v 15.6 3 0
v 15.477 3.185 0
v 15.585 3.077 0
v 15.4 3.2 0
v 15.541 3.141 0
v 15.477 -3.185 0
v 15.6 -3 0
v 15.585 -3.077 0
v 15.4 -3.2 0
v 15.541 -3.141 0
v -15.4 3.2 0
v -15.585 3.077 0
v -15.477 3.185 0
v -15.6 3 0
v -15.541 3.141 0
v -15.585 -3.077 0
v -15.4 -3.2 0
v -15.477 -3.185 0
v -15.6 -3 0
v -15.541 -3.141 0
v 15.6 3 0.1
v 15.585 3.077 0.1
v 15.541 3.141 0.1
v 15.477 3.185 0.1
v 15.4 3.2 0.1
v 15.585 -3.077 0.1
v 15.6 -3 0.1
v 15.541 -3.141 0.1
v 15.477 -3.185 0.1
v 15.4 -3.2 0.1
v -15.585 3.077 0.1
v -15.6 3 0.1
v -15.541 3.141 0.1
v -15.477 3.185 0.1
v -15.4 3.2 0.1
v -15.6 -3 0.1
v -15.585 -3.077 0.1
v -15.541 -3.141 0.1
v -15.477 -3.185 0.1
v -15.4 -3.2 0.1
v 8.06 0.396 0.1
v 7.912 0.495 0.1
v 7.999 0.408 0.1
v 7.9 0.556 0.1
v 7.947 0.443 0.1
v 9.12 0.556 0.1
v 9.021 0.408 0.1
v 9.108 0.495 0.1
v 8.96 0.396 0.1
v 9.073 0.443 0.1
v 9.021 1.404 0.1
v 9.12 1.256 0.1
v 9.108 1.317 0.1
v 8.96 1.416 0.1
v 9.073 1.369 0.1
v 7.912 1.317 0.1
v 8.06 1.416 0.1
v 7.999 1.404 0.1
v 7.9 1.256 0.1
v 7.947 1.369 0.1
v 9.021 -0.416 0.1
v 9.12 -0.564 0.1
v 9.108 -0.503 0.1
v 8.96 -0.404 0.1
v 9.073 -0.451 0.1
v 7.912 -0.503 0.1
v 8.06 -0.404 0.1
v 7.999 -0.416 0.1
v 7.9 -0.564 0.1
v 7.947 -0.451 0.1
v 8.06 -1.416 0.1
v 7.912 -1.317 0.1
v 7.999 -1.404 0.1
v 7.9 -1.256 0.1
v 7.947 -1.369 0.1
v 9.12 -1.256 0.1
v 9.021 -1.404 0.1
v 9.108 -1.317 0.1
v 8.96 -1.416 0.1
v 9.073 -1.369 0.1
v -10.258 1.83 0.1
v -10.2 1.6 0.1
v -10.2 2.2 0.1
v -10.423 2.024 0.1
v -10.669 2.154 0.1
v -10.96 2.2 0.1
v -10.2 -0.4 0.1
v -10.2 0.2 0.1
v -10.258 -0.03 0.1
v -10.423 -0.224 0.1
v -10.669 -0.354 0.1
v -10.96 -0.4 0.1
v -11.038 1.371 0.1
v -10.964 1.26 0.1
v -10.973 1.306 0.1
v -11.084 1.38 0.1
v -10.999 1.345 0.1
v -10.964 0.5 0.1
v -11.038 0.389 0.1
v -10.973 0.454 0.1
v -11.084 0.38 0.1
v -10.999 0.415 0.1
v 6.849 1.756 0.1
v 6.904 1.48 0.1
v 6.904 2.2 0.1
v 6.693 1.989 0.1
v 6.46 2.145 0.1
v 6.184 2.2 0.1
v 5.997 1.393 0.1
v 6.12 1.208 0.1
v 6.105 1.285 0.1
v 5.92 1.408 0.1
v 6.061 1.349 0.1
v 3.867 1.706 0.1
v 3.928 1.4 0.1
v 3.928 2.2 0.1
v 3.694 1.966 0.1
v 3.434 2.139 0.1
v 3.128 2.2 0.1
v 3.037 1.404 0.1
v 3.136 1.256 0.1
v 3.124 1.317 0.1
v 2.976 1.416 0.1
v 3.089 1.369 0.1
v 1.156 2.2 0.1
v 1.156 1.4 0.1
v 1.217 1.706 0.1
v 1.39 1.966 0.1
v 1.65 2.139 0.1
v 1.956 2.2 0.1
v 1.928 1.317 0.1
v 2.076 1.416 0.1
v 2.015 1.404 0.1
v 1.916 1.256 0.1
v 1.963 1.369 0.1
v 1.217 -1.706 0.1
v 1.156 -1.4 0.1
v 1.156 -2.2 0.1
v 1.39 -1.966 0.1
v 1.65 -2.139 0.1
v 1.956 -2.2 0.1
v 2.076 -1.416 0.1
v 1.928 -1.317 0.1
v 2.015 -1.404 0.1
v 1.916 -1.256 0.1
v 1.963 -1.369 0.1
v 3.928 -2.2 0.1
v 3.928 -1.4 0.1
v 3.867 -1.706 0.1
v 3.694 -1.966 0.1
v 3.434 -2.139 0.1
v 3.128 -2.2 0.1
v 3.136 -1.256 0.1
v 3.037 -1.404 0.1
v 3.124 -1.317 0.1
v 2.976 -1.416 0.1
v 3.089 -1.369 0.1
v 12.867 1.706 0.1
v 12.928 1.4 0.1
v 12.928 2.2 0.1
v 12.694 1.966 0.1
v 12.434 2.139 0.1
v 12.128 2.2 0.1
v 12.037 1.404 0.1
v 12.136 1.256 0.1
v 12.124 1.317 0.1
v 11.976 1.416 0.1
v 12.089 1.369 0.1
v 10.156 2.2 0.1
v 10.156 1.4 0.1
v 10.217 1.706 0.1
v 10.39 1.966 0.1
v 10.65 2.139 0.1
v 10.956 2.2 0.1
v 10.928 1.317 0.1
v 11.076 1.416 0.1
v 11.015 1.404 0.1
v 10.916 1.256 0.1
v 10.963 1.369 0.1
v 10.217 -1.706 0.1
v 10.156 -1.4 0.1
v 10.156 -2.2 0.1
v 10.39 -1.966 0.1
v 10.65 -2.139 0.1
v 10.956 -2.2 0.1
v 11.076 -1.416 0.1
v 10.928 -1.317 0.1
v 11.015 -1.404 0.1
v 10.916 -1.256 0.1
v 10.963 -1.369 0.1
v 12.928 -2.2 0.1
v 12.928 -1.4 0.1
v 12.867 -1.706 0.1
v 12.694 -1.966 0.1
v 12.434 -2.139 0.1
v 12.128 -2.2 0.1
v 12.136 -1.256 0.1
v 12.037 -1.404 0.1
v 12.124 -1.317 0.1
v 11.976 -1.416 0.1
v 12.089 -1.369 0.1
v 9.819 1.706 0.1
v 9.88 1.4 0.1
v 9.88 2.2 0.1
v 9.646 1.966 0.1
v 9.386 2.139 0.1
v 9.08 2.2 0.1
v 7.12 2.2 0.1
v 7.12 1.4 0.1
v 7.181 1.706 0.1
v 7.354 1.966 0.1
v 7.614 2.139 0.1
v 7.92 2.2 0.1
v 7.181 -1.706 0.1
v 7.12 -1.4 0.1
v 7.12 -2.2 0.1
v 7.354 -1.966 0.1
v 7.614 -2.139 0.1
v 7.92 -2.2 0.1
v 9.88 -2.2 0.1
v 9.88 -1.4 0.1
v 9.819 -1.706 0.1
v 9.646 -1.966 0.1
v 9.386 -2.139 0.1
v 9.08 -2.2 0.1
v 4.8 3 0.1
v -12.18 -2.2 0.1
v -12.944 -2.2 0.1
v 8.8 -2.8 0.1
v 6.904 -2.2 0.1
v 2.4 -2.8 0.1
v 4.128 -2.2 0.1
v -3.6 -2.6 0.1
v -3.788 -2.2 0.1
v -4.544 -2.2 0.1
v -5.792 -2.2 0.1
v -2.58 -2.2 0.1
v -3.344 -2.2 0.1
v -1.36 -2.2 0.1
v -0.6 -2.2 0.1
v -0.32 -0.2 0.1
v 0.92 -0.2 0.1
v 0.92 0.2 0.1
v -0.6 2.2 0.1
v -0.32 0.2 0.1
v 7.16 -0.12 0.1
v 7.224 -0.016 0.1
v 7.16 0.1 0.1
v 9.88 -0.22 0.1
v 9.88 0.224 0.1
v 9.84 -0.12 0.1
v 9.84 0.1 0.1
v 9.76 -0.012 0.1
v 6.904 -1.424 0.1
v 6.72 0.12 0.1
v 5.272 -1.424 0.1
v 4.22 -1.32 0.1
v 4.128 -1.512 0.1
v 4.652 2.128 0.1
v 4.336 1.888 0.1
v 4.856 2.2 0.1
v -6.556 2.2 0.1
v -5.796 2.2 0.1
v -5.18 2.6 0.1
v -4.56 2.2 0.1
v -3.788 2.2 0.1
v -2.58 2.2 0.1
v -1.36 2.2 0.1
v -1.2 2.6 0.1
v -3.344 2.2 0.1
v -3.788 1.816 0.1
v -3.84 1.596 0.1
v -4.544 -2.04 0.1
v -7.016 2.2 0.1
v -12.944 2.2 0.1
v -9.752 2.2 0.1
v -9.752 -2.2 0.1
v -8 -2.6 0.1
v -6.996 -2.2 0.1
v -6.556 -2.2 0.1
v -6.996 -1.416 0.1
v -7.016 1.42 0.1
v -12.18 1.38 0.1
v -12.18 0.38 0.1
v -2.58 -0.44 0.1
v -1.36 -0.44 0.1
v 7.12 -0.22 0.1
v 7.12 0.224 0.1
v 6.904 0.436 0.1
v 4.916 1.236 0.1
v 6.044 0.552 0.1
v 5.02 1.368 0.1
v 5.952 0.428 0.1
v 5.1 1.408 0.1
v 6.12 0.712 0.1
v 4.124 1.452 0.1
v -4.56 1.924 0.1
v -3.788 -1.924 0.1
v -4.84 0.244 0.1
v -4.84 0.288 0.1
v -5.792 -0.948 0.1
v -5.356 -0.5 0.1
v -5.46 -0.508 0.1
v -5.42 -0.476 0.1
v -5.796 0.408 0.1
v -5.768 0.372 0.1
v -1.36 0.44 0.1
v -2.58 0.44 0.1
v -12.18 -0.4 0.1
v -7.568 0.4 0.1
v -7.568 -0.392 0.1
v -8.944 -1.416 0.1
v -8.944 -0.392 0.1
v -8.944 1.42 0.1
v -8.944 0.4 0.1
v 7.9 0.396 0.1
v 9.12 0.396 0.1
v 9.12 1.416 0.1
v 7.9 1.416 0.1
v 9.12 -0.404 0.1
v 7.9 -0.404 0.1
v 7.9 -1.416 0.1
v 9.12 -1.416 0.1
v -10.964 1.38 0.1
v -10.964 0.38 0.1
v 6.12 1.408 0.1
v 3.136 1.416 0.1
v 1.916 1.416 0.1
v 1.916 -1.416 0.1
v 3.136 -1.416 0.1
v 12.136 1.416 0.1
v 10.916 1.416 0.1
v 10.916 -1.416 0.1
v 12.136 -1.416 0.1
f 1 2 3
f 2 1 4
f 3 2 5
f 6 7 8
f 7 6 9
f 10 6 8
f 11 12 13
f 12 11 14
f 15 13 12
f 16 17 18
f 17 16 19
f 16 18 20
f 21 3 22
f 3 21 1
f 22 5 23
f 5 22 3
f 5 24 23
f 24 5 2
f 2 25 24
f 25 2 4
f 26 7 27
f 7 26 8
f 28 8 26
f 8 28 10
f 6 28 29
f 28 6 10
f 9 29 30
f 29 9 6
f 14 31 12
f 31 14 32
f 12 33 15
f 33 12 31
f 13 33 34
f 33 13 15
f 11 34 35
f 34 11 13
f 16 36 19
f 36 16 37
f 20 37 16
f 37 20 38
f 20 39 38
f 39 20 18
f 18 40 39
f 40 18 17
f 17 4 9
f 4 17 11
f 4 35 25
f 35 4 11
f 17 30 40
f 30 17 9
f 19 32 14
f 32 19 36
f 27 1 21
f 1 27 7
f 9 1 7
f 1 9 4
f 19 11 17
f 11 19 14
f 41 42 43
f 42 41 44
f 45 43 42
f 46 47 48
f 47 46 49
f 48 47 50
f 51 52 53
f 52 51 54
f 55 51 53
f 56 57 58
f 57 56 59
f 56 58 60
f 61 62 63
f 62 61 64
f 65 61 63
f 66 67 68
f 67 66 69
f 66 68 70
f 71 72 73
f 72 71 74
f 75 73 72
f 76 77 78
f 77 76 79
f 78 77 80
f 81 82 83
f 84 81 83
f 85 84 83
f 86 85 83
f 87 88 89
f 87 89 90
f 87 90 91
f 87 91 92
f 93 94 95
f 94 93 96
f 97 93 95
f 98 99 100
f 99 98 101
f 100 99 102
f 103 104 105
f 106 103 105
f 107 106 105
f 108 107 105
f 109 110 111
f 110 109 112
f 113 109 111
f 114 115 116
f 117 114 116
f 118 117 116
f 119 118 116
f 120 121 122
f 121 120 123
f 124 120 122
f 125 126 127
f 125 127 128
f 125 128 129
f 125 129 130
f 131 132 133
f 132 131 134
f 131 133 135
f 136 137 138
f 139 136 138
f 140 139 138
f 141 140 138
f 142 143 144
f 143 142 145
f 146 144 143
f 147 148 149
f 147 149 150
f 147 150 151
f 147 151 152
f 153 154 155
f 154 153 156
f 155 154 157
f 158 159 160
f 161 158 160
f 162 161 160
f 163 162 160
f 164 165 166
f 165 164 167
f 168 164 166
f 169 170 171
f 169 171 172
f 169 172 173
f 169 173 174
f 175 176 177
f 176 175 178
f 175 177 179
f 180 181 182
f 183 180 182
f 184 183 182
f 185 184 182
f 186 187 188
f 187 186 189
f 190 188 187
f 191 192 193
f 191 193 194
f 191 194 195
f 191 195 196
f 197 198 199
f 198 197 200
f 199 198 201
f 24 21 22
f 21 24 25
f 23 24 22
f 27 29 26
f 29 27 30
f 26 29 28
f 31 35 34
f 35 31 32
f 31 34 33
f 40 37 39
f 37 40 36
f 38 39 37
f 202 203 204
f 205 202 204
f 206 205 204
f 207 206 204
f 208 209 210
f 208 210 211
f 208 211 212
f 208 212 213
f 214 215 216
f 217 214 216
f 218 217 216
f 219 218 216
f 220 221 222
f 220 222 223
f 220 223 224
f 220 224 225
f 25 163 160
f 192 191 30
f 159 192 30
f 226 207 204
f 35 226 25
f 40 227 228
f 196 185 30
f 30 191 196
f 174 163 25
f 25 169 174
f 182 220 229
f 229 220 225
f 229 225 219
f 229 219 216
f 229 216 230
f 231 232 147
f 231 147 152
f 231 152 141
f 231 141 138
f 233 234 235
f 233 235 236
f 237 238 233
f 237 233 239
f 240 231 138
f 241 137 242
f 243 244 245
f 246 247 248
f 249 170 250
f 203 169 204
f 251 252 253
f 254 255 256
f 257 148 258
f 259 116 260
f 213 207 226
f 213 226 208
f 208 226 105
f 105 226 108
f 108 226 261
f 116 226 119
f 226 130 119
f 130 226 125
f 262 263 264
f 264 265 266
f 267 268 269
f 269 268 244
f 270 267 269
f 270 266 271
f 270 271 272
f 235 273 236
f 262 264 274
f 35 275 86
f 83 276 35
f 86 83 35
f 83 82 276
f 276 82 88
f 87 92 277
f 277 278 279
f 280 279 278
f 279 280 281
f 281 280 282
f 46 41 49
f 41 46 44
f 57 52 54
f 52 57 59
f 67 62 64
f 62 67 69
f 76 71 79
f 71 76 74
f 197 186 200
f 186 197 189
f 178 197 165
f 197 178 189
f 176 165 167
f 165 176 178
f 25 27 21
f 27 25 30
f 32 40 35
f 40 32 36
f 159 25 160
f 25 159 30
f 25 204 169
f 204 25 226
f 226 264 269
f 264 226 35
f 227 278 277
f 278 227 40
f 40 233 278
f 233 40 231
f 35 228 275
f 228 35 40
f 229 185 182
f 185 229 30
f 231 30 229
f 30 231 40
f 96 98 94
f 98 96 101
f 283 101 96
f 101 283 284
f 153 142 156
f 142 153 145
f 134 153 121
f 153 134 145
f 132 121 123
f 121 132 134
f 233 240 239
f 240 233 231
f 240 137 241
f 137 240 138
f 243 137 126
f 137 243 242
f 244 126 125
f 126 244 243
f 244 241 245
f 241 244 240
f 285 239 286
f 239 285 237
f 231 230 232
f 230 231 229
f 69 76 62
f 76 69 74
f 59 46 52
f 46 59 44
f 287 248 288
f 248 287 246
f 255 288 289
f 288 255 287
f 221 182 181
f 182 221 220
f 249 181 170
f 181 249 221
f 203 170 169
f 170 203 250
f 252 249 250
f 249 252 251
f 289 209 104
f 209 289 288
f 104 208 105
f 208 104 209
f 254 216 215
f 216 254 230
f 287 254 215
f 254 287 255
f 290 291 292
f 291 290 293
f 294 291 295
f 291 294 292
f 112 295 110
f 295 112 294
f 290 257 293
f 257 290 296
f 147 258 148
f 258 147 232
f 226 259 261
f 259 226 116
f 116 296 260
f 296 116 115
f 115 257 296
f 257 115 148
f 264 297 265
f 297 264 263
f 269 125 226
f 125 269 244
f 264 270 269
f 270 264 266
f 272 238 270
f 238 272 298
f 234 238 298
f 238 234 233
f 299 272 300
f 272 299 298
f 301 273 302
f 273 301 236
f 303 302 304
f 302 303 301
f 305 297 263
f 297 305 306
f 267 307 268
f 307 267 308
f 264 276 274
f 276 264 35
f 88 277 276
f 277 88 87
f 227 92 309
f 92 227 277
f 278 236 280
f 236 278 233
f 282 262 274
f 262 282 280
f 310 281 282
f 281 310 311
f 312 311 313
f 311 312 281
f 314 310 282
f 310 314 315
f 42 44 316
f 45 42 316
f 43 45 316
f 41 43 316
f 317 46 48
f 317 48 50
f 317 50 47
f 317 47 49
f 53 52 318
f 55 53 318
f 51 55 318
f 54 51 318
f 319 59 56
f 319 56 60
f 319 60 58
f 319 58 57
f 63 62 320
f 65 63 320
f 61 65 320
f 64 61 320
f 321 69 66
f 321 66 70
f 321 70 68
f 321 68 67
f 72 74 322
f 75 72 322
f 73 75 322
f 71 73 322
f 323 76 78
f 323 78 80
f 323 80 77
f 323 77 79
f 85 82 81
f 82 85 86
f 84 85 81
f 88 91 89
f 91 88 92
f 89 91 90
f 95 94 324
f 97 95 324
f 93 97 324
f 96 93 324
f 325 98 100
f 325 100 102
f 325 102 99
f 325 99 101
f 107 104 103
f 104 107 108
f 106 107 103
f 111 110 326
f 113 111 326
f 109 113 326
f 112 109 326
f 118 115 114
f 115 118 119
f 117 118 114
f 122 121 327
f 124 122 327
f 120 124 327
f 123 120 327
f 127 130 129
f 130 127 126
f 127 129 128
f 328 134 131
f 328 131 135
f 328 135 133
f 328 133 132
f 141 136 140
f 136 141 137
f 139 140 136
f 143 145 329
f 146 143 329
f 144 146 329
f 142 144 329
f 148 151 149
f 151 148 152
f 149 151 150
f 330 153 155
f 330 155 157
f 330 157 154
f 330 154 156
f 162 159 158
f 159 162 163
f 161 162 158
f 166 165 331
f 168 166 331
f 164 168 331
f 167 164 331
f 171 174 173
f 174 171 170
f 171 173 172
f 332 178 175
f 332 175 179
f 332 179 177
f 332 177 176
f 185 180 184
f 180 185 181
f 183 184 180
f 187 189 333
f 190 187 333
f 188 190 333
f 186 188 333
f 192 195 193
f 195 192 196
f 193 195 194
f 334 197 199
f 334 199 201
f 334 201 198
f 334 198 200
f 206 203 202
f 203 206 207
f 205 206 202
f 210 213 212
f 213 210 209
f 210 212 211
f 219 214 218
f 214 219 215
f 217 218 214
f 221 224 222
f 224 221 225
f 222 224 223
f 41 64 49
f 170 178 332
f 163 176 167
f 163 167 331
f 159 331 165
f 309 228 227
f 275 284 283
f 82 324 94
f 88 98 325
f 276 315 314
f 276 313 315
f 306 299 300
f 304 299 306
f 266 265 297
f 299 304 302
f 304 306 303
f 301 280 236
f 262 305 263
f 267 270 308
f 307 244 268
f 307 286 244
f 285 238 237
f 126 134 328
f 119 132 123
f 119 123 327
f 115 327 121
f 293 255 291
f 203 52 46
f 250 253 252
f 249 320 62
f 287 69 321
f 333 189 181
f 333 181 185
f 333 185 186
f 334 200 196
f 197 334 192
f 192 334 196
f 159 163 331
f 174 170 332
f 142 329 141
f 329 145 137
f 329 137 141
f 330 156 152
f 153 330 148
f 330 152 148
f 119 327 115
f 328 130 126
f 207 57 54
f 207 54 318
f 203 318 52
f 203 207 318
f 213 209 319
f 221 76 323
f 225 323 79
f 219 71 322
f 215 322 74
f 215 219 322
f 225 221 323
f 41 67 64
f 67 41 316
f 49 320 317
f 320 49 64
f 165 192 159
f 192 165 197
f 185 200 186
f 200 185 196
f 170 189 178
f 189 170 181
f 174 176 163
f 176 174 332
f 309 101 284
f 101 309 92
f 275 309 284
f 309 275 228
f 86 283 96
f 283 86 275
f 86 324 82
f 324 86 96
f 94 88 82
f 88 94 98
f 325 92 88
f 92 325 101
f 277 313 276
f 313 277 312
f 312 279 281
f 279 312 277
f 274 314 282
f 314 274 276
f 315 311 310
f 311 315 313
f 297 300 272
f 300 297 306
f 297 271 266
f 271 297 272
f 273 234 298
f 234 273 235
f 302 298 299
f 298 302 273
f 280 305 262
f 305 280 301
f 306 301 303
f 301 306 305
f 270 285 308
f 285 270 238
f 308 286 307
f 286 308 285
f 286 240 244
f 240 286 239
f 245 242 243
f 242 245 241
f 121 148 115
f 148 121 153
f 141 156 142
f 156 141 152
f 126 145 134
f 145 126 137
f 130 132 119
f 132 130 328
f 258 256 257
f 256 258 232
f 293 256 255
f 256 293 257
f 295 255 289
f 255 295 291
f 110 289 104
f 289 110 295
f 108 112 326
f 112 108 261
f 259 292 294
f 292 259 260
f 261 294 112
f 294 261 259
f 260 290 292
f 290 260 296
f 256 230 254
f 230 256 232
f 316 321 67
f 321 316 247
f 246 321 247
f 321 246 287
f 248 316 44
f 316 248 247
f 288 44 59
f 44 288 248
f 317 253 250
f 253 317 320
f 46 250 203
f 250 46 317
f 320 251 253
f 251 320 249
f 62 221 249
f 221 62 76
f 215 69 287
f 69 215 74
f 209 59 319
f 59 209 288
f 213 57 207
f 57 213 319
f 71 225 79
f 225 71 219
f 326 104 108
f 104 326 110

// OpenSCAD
// file: ../p/1-4ndis.scad
use <../lib.scad>
function ldraw_lib__1_4ndis() = [
// 0 Disc Negative 0.25
// 0 Name: 1-4ndis.dat
// 0 Author: James Jessiman
// 0 !LDRAW_ORG Primitive UPDATE 2012-01
// 0 !LICENSE Licensed under CC BY 2.0 and CC BY 4.0 : see CAreadme.txt
// 
// 0 BFC CERTIFY CCW
  [0,"BFC","CERTIFY"],
  [0,"BFC","CCW"],
// 
// 0 !HISTORY 2002-03-23 [sbliss] Added BFC Statement
// 0 !HISTORY 2002-04-25 [PTadmin] Official Update 2002-02
// 0 !HISTORY 2007-06-22 [PTadmin] Header formatted for Contributor Agreement
// 0 !HISTORY 2008-07-01 [PTadmin] Official Update 2008-01
// 0 !HISTORY 2012-02-16 [Philo] Changed to CCW
// 0 !HISTORY 2012-03-30 [PTadmin] Official Update 2012-01
// 
// 
// 3 16 0.9239 0 0.3827 1 0 0 1 0 1
  [3,16,0.9239,0,0.3827,1,0,0,1,0,1],
// 3 16 0.7071 0 0.7071 0.9239 0 0.3827 1 0 1
  [3,16,0.7071,0,0.7071,0.9239,0,0.3827,1,0,1],
// 3 16 0.3827 0 0.9239 0.7071 0 0.7071 1 0 1
  [3,16,0.3827,0,0.9239,0.7071,0,0.7071,1,0,1],
// 3 16 0 0 1 0.3827 0 0.9239 1 0 1
  [3,16,0,0,1,0.3827,0,0.9239,1,0,1],
];
module ldraw_lib__1_4ndis(step=0, col=false, unit=2/5, alt=false, line=0.2, solid=!$preview)
    makepoly(ldraw_lib__1_4ndis(), step=step, col=col, unit=unit, alt=alt, line=line, solid=solid);
ldraw_lib__1_4ndis(line=0.2);
// file: ../p/box3u12.scad
use <../lib.scad>
function ldraw_lib__box3u12() = [
// 0 Box with 3 Parallel Faces without Any Edges
// 0 Name: box3u12.dat
// 0 Author: J.C. Tchang [tchang]
// 0 !LDRAW_ORG Primitive UPDATE 2014-02
// 0 !LICENSE Licensed under CC BY 2.0 and CC BY 4.0 : see CAreadme.txt
// 
// 0 BFC CERTIFY CCW
  [0,"BFC","CERTIFY"],
  [0,"BFC","CCW"],
// 
// 0 !HISTORY 2014-12-23 [PTadmin] Official Update 2014-02
// 
// 
// 4 16 -1 1 1 1 1 1 1 1 -1 -1 1 -1
  [4,16,-1,1,1,1,1,1,1,1,-1,-1,1,-1],
// 4 16 -1 1 1 -1 0 1 1 0 1 1 1 1
  [4,16,-1,1,1,-1,0,1,1,0,1,1,1,1],
// 4 16 1 1 -1 1 0 -1 -1 0 -1 -1 1 -1
  [4,16,1,1,-1,1,0,-1,-1,0,-1,-1,1,-1],
];
module ldraw_lib__box3u12(step=0, col=false, unit=2/5, alt=false, line=0.2, solid=!$preview)
    makepoly(ldraw_lib__box3u12(), step=step, col=col, unit=unit, alt=alt, line=line, solid=solid);
ldraw_lib__box3u12(line=0.2);
// file: ../p/1-4cyli.scad
use <../lib.scad>
function ldraw_lib__1_4cyli() = [
// 0 Cylinder 0.25
// 0 Name: 1-4cyli.dat
// 0 Author: James Jessiman
// 0 !LDRAW_ORG Primitive UPDATE 2012-01
// 0 !LICENSE Licensed under CC BY 2.0 and CC BY 4.0 : see CAreadme.txt
// 
// 0 BFC CERTIFY CCW
  [0,"BFC","CERTIFY"],
  [0,"BFC","CCW"],
// 
// 0 !HISTORY 2002-03-23 [sbliss] Added BFC statement.
// 0 !HISTORY 2002-04-25 [PTadmin] Official Update 2002-02
// 0 !HISTORY 2007-06-22 [PTadmin] Header formatted for Contributor Agreement
// 0 !HISTORY 2008-07-01 [PTadmin] Official Update 2008-01
// 0 !HISTORY 2012-02-16 [Philo] Changed to CCW
// 0 !HISTORY 2012-03-30 [PTadmin] Official Update 2012-01
// 
// 
// 4 16 1 1 0 0.9239 1 0.3827 0.9239 0 0.3827 1 0 0
  [4,16,1,1,0,0.9239,1,0.3827,0.9239,0,0.3827,1,0,0],
// 5 24 1 0 0 1 1 0 0.9239 0 0.3827 1 0 -1
  [5,24,1,0,0,1,1,0,0.9239,0,0.3827,1,0,-1],
// 4 16 0.9239 1 0.3827 0.7071 1 0.7071 0.7071 0 0.7071 0.9239 0 0.3827
  [4,16,0.9239,1,0.3827,0.7071,1,0.7071,0.7071,0,0.7071,0.9239,0,0.3827],
// 5 24 0.9239 0 0.3827 0.9239 1 0.3827 0.7071 0 0.7071 1 0 0
  [5,24,0.9239,0,0.3827,0.9239,1,0.3827,0.7071,0,0.7071,1,0,0],
// 4 16 0.7071 1 0.7071 0.3827 1 0.9239 0.3827 0 0.9239 0.7071 0 0.7071
  [4,16,0.7071,1,0.7071,0.3827,1,0.9239,0.3827,0,0.9239,0.7071,0,0.7071],
// 5 24 0.7071 0 0.7071 0.7071 1 0.7071 0.3827 0 0.9239 0.9239 0 0.3827
  [5,24,0.7071,0,0.7071,0.7071,1,0.7071,0.3827,0,0.9239,0.9239,0,0.3827],
// 4 16 0.3827 1 0.9239 0 1 1 0 0 1 0.3827 0 0.9239
  [4,16,0.3827,1,0.9239,0,1,1,0,0,1,0.3827,0,0.9239],
// 5 24 0.3827 0 0.9239 0.3827 1 0.9239 0 0 1 0.7071 0 0.7071
  [5,24,0.3827,0,0.9239,0.3827,1,0.9239,0,0,1,0.7071,0,0.7071],
// 5 24 0 0 1 0 1 1 0.3827 0 0.9239 -1 0 1
  [5,24,0,0,1,0,1,1,0.3827,0,0.9239,-1,0,1],
];
module ldraw_lib__1_4cyli(step=0, col=false, unit=2/5, alt=false, line=0.2, solid=!$preview)
    makepoly(ldraw_lib__1_4cyli(), step=step, col=col, unit=unit, alt=alt, line=line, solid=solid);
ldraw_lib__1_4cyli(line=0.2);
// file: ../p/1-4chrd.scad
use <../lib.scad>
function ldraw_lib__1_4chrd() = [
// 0 Chord 0.25
// 0 Name: 1-4chrd.dat
// 0 Author: Tony Hafner [hafhead]
// 0 !LDRAW_ORG Primitive UPDATE 2012-02
// 0 !LICENSE Licensed under CC BY 2.0 and CC BY 4.0 : see CAreadme.txt
// 
// 0 BFC CERTIFY CCW
  [0,"BFC","CERTIFY"],
  [0,"BFC","CCW"],
// 
// 0 !HISTORY 2004-04-22 [PTadmin] Official Update 2004-02
// 0 !HISTORY 2007-10-09 [PTadmin] Header formatted for Contributor Agreement
// 0 !HISTORY 2008-07-01 [PTadmin] Official Update 2008-01
// 0 !HISTORY 2012-08-02 [MMR1988] Re-creation with PrimGen2 and Rectifier
// 0 !HISTORY 2012-08-09 [PTadmin] Official Update 2012-02
// 
// 
// 4 16 0.9239 0 0.3827 0.3827 0 0.9239 0 0 1 1 0 0
  [4,16,0.9239,0,0.3827,0.3827,0,0.9239,0,0,1,1,0,0],
// 3 16 0.7071 0 0.7071 0.3827 0 0.9239 0.9239 0 0.3827
  [3,16,0.7071,0,0.7071,0.3827,0,0.9239,0.9239,0,0.3827],
];
module ldraw_lib__1_4chrd(step=0, col=false, unit=2/5, alt=false, line=0.2, solid=!$preview)
    makepoly(ldraw_lib__1_4chrd(), step=step, col=col, unit=unit, alt=alt, line=line, solid=solid);
ldraw_lib__1_4chrd(line=0.2);
// main file
use <../lib.scad>
use <../p/1-4chrd.scad>
use <../p/1-4cyli.scad>
use <../p/box3u12.scad>
use <s/6258203js01.scad>
function ldraw_lib__6258203k() = [
// 0 Sticker  0.8 x  3.9 with Yellow License Plate "PEKH-0280"
// 0 Name: 6258203k.dat
// 0 Author: Ulrich Röder [UR]
// 0 !LDRAW_ORG Part UPDATE 2019-01
// 0 !LICENSE Licensed under CC BY 2.0 and CC BY 4.0 : see CAreadme.txt
// 
// 0 BFC CERTIFY CCW
  [0,"BFC","CERTIFY"],
  [0,"BFC","CCW"],
// 
// 0 !KEYWORDS Ford, Mustang, Set 10265
// 
// 0 !HISTORY 2019-06-28 [PTadmin] Official Update 2019-01
// 
// 
// 0 // Font: Registration Plate UK
// 
// 0 // Main
// 0 // Box Rounded
// 
// 1 16 38.5 0 7.5 .5 0 0 0 -1 0 0 0 .5 1-4chrd.dat
  [1,16,38.5,0,7.5,.5,0,0,0,-1,0,0,0,.5, ldraw_lib__1_4chrd()],
// 1 16 38.5 0 -7.5 .5 0 0 0 -1 0 0 0 -.5 1-4chrd.dat
  [1,16,38.5,0,-7.5,.5,0,0,0,-1,0,0,0,-.5, ldraw_lib__1_4chrd()],
// 1 16 -38.5 0 7.5 -.5 0 0 0 -1 0 0 0 .5 1-4chrd.dat
  [1,16,-38.5,0,7.5,-.5,0,0,0,-1,0,0,0,.5, ldraw_lib__1_4chrd()],
// 1 16 -38.5 0 -7.5 -.5 0 0 0 -1 0 0 0 -.5 1-4chrd.dat
  [1,16,-38.5,0,-7.5,-.5,0,0,0,-1,0,0,0,-.5, ldraw_lib__1_4chrd()],
// 1 16 38.5 0 7.5 .5 0 0 0 -.25 0 0 0 .5 1-4cyli.dat
  [1,16,38.5,0,7.5,.5,0,0,0,-.25,0,0,0,.5, ldraw_lib__1_4cyli()],
// 1 16 38.5 0 -7.5 .5 0 0 0 -.25 0 0 0 -.5 1-4cyli.dat
  [1,16,38.5,0,-7.5,.5,0,0,0,-.25,0,0,0,-.5, ldraw_lib__1_4cyli()],
// 1 16 -38.5 0 7.5 -.5 0 0 0 -.25 0 0 0 .5 1-4cyli.dat
  [1,16,-38.5,0,7.5,-.5,0,0,0,-.25,0,0,0,.5, ldraw_lib__1_4cyli()],
// 1 16 -38.5 0 -7.5 -.5 0 0 0 -.25 0 0 0 -.5 1-4cyli.dat
  [1,16,-38.5,0,-7.5,-.5,0,0,0,-.25,0,0,0,-.5, ldraw_lib__1_4cyli()],
// 1 16 0 -.25 0 38.5 0 0 0 .25 0 0 0 8 box3u12.dat
  [1,16,0,-.25,0,38.5,0,0,0,.25,0,0,0,8, ldraw_lib__box3u12()],
// 4 16 -39 -.25 -7.5 -39 -.25 7.5 -39 0 7.5 -39 0 -7.5
  [4,16,-39,-.25,-7.5,-39,-.25,7.5,-39,0,7.5,-39,0,-7.5],
// 4 16 39 0 7.5 39 -.25 7.5 39 -.25 -7.5 39 0 -7.5
  [4,16,39,0,7.5,39,-.25,7.5,39,-.25,-7.5,39,0,-7.5],
// 4 16 39 0 7.5 39 0 -7.5 38.5 0 -8 38.5 0 8
  [4,16,39,0,7.5,39,0,-7.5,38.5,0,-8,38.5,0,8],
// 4 16 -39 0 7.5 -38.5 0 8 -38.5 0 -8 -39 0 -7.5
  [4,16,-39,0,7.5,-38.5,0,8,-38.5,0,-8,-39,0,-7.5],
// 
// 0 // Yellow
// 1 14 0 0 0 1 0 0 0 1 0 0 0 1 s\6258203js01.dat
  [1,14,0,0,0,1,0,0,0,1,0,0,0,1, ldraw_lib__s__6258203js01()],
];
module ldraw_lib__6258203k(step=0, col=false, unit=2/5, alt=false, line=0.2, solid=!$preview)
    makepoly(ldraw_lib__6258203k(), step=step, col=col, unit=unit, alt=alt, line=line, solid=solid);
ldraw_lib__6258203k(line=0.2);
